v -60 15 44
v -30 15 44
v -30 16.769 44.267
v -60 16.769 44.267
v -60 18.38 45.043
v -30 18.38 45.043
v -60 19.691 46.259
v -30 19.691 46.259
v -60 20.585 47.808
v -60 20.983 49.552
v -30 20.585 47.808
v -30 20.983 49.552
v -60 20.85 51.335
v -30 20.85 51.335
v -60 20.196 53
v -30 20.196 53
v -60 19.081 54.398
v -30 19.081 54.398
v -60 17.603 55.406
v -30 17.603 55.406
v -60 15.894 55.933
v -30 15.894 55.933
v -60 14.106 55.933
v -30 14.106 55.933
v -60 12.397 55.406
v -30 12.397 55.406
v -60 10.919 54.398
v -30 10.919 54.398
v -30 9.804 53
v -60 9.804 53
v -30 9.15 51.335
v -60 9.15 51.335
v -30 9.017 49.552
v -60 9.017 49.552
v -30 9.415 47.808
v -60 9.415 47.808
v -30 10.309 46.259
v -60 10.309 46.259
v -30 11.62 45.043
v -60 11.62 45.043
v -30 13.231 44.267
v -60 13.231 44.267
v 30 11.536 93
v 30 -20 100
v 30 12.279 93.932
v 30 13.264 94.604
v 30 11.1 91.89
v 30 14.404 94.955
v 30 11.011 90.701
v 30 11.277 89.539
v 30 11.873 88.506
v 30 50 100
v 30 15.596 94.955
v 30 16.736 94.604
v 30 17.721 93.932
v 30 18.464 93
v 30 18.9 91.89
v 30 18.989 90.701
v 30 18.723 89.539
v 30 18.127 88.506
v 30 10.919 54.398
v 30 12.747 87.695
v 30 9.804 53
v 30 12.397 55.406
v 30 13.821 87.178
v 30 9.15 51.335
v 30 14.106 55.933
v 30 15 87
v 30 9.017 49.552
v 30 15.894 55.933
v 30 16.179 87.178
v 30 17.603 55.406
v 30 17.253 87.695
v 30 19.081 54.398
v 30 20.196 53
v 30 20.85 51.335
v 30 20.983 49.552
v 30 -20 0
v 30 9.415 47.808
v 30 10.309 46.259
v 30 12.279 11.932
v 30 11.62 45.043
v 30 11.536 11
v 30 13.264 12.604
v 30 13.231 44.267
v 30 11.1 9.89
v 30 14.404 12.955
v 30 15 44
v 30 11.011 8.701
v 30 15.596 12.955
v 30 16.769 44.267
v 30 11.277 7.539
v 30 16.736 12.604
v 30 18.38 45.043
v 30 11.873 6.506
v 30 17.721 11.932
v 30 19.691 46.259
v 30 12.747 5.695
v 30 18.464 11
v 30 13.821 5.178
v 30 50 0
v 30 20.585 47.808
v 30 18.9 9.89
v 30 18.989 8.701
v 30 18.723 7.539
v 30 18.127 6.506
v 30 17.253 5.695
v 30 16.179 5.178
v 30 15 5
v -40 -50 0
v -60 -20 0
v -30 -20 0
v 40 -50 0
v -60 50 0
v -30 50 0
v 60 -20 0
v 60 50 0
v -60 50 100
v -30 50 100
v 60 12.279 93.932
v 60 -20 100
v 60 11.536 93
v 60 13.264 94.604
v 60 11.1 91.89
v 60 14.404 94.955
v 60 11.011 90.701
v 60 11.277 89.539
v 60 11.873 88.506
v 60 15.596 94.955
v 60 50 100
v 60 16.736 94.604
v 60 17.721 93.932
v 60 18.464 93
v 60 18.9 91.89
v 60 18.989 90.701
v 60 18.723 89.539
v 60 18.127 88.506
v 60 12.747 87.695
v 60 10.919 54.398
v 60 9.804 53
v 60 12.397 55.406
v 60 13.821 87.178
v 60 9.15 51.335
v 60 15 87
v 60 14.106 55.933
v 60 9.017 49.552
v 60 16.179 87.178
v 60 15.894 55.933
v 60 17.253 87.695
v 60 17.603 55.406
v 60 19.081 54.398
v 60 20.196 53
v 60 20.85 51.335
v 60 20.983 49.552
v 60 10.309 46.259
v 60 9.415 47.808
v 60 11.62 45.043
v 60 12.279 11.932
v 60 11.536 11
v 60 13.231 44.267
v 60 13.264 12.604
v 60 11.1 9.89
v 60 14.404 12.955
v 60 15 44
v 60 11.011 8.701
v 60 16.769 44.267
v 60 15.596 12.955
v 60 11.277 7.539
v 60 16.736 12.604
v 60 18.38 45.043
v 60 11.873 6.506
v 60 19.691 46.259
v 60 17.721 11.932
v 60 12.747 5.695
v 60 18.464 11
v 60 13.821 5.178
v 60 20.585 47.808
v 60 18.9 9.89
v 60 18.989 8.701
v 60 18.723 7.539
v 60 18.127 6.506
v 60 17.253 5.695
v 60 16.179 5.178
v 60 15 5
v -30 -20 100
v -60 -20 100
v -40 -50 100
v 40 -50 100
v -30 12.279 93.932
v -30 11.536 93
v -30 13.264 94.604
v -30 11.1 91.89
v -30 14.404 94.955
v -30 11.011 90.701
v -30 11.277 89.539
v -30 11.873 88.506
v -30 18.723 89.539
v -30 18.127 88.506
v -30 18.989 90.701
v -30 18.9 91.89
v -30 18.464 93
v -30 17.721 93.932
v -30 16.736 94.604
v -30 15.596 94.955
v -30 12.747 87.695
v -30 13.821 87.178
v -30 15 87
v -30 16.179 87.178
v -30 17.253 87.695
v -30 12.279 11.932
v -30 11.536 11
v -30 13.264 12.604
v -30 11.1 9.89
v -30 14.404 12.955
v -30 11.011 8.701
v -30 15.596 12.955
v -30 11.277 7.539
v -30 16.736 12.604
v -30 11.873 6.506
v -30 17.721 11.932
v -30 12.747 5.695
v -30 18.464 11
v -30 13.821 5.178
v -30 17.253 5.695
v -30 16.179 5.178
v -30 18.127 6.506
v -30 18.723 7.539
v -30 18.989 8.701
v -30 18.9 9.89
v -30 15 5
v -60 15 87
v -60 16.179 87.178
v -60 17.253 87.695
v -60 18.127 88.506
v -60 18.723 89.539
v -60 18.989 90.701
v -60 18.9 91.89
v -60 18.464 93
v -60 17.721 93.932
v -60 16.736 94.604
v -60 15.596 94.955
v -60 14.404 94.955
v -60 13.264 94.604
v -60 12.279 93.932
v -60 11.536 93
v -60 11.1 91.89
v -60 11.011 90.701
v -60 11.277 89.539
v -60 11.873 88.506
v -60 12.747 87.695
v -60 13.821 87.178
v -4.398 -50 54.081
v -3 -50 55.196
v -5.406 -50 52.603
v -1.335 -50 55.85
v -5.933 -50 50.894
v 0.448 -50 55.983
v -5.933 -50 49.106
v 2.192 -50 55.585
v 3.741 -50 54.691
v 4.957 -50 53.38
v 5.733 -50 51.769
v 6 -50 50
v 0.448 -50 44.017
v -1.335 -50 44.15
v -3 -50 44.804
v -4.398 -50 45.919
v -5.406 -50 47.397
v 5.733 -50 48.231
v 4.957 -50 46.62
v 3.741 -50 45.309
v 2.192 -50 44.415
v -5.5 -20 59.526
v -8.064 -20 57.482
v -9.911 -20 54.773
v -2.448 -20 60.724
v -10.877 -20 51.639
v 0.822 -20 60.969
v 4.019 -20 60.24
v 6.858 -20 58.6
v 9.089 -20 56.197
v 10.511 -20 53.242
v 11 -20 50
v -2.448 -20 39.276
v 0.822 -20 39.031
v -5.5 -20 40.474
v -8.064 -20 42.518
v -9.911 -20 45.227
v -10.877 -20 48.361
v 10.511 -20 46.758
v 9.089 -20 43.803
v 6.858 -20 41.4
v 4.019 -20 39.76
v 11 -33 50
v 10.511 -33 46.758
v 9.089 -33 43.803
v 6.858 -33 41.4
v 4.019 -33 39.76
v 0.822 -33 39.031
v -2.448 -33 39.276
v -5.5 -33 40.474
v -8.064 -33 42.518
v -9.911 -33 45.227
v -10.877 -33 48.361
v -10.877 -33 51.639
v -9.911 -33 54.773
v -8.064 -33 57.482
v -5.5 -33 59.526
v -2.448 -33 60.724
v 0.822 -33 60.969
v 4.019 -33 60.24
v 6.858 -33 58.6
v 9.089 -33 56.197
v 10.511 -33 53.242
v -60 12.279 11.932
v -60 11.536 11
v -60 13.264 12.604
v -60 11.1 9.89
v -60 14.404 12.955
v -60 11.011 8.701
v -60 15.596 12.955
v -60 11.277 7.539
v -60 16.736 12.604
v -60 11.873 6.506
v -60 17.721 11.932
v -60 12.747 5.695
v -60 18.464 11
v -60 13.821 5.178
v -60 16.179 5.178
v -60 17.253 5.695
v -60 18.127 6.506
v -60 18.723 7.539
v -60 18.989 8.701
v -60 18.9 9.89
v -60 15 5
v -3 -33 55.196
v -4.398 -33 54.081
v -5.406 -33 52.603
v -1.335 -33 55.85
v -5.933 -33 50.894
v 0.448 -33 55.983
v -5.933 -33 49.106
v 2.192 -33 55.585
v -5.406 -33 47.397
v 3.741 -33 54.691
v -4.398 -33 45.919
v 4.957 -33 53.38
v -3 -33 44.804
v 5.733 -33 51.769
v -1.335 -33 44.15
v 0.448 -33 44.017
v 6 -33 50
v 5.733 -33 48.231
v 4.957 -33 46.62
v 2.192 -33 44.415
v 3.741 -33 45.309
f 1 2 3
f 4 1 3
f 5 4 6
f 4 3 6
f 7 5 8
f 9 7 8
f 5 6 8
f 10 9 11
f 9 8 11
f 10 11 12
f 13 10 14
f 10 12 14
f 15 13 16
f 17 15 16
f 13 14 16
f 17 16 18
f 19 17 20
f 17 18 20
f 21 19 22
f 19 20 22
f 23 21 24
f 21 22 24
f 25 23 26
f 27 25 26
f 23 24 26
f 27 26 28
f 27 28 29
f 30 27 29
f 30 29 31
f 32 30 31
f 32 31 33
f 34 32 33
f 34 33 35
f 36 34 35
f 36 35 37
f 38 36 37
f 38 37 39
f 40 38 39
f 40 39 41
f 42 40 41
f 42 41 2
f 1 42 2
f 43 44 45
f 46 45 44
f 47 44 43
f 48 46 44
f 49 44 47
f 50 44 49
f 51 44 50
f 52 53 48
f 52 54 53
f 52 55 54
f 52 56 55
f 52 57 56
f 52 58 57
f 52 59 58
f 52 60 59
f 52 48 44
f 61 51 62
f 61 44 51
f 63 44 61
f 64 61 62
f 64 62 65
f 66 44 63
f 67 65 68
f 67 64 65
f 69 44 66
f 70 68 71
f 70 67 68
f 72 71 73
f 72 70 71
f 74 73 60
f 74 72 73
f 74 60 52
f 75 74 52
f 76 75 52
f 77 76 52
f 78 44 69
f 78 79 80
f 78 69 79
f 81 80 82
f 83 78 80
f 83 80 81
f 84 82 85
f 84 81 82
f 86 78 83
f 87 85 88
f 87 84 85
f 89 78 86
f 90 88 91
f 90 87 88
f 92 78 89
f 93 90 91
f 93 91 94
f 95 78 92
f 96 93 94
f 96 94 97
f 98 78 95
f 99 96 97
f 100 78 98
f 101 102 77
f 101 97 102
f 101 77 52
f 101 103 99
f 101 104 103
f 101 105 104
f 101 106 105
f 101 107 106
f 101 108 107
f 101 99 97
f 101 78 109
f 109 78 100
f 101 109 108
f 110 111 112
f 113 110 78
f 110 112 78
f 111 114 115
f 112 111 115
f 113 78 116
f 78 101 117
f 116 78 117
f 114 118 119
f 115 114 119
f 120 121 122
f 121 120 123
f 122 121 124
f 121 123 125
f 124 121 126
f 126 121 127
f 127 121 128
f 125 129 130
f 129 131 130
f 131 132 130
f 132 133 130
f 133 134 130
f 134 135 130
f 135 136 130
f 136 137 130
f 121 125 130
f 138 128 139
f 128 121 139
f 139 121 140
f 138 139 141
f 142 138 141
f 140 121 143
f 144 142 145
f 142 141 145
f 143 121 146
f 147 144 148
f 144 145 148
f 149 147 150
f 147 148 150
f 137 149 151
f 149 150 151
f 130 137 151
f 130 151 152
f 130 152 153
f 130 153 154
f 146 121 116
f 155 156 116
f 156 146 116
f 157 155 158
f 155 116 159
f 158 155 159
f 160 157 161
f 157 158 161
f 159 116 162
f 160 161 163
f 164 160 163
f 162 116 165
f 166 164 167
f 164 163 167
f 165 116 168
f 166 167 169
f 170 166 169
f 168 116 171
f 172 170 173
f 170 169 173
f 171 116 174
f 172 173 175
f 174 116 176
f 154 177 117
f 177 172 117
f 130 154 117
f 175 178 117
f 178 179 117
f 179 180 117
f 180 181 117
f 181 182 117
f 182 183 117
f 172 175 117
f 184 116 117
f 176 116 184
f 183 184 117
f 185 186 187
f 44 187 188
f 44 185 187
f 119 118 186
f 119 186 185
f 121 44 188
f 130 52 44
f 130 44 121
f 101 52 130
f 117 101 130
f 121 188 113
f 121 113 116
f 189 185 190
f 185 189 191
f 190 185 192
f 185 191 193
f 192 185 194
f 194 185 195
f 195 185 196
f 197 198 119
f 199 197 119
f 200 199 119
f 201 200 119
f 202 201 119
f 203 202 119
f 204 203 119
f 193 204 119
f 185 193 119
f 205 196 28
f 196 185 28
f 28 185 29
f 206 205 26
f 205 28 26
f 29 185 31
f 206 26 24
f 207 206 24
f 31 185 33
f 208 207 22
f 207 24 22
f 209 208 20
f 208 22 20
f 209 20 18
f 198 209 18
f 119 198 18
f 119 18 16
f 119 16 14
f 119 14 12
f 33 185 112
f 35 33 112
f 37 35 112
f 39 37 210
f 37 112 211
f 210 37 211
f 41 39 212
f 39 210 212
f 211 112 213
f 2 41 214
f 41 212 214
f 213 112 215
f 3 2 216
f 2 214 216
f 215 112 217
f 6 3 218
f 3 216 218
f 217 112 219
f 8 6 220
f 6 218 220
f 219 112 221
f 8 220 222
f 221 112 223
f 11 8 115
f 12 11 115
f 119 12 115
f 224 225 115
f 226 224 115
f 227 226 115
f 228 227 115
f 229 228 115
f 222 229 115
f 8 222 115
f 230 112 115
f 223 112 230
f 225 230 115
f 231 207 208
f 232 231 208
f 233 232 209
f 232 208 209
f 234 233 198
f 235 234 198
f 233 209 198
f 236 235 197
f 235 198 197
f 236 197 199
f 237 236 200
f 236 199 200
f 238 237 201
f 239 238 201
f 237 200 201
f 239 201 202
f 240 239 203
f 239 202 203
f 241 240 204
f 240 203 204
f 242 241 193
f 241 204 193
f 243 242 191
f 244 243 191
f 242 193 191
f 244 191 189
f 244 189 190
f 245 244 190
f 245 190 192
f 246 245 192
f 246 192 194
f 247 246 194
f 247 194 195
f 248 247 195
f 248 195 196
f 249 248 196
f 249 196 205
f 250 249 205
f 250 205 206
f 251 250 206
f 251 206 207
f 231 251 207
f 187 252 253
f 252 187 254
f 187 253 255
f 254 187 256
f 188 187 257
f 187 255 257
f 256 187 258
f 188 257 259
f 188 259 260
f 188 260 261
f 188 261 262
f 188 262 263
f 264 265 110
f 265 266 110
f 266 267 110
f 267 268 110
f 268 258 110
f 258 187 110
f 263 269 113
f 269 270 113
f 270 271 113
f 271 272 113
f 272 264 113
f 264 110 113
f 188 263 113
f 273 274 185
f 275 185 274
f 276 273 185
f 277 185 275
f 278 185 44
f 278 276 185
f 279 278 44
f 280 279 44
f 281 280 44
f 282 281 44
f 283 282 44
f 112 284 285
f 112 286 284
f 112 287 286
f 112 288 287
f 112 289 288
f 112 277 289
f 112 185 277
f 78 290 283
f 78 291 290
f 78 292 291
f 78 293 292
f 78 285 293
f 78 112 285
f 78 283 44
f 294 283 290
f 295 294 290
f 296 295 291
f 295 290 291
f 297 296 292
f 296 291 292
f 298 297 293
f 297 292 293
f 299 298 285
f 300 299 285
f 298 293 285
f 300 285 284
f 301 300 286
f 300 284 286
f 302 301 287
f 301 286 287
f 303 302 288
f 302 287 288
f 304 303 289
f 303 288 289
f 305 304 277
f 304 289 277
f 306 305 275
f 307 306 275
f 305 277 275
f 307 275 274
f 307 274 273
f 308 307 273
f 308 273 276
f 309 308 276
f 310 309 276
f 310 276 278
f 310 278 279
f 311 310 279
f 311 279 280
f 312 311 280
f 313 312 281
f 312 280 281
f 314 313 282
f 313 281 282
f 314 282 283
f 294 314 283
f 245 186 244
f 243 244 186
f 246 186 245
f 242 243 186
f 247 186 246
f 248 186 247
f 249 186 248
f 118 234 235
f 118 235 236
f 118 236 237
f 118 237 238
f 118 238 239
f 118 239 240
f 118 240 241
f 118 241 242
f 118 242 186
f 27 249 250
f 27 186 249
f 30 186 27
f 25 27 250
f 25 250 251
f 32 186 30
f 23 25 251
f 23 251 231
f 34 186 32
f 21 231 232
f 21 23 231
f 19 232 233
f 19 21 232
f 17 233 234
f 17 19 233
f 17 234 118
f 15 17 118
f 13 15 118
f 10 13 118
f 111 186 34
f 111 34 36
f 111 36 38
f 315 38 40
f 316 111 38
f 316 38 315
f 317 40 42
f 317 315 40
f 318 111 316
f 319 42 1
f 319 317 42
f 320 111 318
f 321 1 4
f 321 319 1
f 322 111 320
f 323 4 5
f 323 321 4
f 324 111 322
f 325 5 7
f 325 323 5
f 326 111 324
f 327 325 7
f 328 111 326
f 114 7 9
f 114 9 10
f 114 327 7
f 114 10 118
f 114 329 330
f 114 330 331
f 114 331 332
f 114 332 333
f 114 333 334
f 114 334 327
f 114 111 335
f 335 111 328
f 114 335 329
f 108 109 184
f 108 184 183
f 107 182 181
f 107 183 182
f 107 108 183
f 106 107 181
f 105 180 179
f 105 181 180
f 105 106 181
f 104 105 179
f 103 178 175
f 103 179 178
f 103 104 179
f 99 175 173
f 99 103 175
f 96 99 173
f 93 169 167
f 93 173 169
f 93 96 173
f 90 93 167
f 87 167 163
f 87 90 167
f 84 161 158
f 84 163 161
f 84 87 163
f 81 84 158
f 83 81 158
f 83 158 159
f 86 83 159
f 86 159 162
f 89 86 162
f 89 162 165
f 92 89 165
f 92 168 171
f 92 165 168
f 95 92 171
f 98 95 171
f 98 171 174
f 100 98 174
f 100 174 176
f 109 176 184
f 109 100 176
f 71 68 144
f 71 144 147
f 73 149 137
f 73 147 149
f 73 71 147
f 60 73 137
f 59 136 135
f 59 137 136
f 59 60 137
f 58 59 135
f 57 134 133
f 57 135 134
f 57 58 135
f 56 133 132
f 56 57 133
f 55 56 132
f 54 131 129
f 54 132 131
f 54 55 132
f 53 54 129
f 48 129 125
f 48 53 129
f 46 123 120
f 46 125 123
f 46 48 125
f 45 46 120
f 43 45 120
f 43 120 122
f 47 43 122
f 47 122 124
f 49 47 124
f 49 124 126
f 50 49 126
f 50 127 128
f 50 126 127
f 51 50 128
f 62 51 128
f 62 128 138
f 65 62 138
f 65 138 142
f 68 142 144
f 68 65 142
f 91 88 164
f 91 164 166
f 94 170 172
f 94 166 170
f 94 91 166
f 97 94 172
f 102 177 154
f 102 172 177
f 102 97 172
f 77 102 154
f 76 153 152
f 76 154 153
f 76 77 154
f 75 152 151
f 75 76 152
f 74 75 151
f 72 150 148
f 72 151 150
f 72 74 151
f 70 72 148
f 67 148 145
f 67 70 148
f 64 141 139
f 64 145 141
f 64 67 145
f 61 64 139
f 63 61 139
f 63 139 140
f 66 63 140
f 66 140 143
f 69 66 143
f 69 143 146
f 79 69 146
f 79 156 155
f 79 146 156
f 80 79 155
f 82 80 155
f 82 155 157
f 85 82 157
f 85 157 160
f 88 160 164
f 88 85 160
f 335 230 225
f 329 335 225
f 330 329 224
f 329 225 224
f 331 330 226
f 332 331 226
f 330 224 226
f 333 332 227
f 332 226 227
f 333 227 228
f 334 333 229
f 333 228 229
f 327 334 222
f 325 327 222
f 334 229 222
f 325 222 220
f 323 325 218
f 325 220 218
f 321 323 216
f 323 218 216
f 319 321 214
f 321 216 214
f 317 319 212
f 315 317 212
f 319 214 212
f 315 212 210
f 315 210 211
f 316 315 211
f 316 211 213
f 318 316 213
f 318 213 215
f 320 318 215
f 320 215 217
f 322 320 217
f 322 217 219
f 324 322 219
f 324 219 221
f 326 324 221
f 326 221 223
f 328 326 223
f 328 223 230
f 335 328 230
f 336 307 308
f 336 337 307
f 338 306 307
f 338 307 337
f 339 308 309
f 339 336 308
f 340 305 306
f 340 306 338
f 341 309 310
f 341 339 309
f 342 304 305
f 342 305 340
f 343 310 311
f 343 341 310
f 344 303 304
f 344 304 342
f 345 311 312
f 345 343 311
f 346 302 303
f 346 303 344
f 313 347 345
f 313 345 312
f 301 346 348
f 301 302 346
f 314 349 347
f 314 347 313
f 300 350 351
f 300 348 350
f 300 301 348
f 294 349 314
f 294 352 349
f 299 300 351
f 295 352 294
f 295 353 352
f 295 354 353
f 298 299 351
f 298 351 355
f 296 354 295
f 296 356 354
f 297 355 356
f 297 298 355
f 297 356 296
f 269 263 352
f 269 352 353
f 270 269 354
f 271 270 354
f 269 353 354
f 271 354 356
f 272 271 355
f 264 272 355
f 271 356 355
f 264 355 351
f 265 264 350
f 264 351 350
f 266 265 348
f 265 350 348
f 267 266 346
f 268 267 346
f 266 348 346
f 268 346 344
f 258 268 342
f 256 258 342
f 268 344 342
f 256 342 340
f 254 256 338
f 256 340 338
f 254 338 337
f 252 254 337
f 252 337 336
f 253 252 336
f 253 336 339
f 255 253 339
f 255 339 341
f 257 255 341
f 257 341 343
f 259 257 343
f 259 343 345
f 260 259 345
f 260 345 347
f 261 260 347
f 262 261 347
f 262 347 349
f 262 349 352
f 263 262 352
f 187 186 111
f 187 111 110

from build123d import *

# Parameters (mm, degrees)
SKETCH1_W               = 120
SKETCH1_H               = 100
BOSS_EXTRUDE1_DEPTH     = 100
SKETCH2_W               = 60
SKETCH2_H               = 70
CUT_EXTRUDE2_DEPTH      = 101
CUT_EXTRUDE2_DEPTH_BACK = 1
SKETCH3_R               = 6
CUT_EXTRUDE3_DEPTH      = 51
CUT_EXTRUDE3_DEPTH_BACK = 51
SKETCH5_R               = 4
CUT_EXTRUDE4_DEPTH      = 61
CUT_EXTRUDE4_DEPTH_BACK = 61
SKETCH6_R               = 6
CUT_EXTRUDE5_DEPTH      = 61
CUT_EXTRUDE5_DEPTH_BACK = 61
CUT_EXTRUDE7_START      = -20
SKETCH7_R               = 11
CUT_EXTRUDE7_DEPTH      = 13


with BuildPart() as part:
    # Sketch1 → Boss-Extrude1 (new body)
    with BuildSketch(Plane.XY):
        Rectangle(SKETCH1_W, SKETCH1_H)
    extrude(amount=BOSS_EXTRUDE1_DEPTH)

    # Sketch2 → Cut-Extrude2 (cut, two sides)
    with BuildSketch(Plane.XY) as cut_extrude2_sk:
        Polygon((-60, -20), (-40, -50), (-60, -50), align=None)
        with Locations((0, 15)):
            Rectangle(SKETCH2_W, SKETCH2_H)
        Polygon((60, -50), (40, -50), (60, -20), align=None)
    extrude(amount=CUT_EXTRUDE2_DEPTH, mode=Mode.SUBTRACT)
    extrude(cut_extrude2_sk.sketch, amount=-CUT_EXTRUDE2_DEPTH_BACK, mode=Mode.SUBTRACT)

    # Sketch3 → Cut-Extrude3 (cut, two sides)
    with BuildSketch(Plane(origin=(0, 0, 0), x_dir=(1, 0, 0), z_dir=(0, 1, 0))) as cut_extrude3_sk:
        with Locations((0, -50)):
            Circle(SKETCH3_R)
    extrude(amount=CUT_EXTRUDE3_DEPTH, mode=Mode.SUBTRACT)
    extrude(cut_extrude3_sk.sketch, amount=-CUT_EXTRUDE3_DEPTH_BACK, mode=Mode.SUBTRACT)

    # Sketch5 → Cut-Extrude4 (cut, two sides)
    with BuildSketch(Plane(origin=(0, 0, 0), x_dir=(0, 0, -1), z_dir=(1, 0, 0))) as cut_extrude4_sk:
        with Locations((-91, 15)):
            Circle(SKETCH5_R)
        with Locations((-9, 15)):
            Circle(SKETCH5_R)
    extrude(amount=CUT_EXTRUDE4_DEPTH, mode=Mode.SUBTRACT)
    extrude(cut_extrude4_sk.sketch, amount=-CUT_EXTRUDE4_DEPTH_BACK, mode=Mode.SUBTRACT)

    # Sketch6 → Cut-Extrude5 (cut, two sides)
    with BuildSketch(Plane(origin=(0, 0, 0), x_dir=(0, 0, -1), z_dir=(1, 0, 0))) as cut_extrude5_sk:
        with Locations((-50, 15)):
            Circle(SKETCH6_R)
    extrude(amount=CUT_EXTRUDE5_DEPTH, mode=Mode.SUBTRACT)
    extrude(cut_extrude5_sk.sketch, amount=-CUT_EXTRUDE5_DEPTH_BACK, mode=Mode.SUBTRACT)

    # Sketch7 → Cut-Extrude7 (cut)
    with BuildSketch(Plane(origin=(0, 0, 0), x_dir=(1, 0, 0), z_dir=(0, 1, 0)).offset(CUT_EXTRUDE7_START)):
        with Locations((0, -50)):
            Circle(SKETCH7_R)
    extrude(amount=-CUT_EXTRUDE7_DEPTH, mode=Mode.SUBTRACT)


solid = part.part
